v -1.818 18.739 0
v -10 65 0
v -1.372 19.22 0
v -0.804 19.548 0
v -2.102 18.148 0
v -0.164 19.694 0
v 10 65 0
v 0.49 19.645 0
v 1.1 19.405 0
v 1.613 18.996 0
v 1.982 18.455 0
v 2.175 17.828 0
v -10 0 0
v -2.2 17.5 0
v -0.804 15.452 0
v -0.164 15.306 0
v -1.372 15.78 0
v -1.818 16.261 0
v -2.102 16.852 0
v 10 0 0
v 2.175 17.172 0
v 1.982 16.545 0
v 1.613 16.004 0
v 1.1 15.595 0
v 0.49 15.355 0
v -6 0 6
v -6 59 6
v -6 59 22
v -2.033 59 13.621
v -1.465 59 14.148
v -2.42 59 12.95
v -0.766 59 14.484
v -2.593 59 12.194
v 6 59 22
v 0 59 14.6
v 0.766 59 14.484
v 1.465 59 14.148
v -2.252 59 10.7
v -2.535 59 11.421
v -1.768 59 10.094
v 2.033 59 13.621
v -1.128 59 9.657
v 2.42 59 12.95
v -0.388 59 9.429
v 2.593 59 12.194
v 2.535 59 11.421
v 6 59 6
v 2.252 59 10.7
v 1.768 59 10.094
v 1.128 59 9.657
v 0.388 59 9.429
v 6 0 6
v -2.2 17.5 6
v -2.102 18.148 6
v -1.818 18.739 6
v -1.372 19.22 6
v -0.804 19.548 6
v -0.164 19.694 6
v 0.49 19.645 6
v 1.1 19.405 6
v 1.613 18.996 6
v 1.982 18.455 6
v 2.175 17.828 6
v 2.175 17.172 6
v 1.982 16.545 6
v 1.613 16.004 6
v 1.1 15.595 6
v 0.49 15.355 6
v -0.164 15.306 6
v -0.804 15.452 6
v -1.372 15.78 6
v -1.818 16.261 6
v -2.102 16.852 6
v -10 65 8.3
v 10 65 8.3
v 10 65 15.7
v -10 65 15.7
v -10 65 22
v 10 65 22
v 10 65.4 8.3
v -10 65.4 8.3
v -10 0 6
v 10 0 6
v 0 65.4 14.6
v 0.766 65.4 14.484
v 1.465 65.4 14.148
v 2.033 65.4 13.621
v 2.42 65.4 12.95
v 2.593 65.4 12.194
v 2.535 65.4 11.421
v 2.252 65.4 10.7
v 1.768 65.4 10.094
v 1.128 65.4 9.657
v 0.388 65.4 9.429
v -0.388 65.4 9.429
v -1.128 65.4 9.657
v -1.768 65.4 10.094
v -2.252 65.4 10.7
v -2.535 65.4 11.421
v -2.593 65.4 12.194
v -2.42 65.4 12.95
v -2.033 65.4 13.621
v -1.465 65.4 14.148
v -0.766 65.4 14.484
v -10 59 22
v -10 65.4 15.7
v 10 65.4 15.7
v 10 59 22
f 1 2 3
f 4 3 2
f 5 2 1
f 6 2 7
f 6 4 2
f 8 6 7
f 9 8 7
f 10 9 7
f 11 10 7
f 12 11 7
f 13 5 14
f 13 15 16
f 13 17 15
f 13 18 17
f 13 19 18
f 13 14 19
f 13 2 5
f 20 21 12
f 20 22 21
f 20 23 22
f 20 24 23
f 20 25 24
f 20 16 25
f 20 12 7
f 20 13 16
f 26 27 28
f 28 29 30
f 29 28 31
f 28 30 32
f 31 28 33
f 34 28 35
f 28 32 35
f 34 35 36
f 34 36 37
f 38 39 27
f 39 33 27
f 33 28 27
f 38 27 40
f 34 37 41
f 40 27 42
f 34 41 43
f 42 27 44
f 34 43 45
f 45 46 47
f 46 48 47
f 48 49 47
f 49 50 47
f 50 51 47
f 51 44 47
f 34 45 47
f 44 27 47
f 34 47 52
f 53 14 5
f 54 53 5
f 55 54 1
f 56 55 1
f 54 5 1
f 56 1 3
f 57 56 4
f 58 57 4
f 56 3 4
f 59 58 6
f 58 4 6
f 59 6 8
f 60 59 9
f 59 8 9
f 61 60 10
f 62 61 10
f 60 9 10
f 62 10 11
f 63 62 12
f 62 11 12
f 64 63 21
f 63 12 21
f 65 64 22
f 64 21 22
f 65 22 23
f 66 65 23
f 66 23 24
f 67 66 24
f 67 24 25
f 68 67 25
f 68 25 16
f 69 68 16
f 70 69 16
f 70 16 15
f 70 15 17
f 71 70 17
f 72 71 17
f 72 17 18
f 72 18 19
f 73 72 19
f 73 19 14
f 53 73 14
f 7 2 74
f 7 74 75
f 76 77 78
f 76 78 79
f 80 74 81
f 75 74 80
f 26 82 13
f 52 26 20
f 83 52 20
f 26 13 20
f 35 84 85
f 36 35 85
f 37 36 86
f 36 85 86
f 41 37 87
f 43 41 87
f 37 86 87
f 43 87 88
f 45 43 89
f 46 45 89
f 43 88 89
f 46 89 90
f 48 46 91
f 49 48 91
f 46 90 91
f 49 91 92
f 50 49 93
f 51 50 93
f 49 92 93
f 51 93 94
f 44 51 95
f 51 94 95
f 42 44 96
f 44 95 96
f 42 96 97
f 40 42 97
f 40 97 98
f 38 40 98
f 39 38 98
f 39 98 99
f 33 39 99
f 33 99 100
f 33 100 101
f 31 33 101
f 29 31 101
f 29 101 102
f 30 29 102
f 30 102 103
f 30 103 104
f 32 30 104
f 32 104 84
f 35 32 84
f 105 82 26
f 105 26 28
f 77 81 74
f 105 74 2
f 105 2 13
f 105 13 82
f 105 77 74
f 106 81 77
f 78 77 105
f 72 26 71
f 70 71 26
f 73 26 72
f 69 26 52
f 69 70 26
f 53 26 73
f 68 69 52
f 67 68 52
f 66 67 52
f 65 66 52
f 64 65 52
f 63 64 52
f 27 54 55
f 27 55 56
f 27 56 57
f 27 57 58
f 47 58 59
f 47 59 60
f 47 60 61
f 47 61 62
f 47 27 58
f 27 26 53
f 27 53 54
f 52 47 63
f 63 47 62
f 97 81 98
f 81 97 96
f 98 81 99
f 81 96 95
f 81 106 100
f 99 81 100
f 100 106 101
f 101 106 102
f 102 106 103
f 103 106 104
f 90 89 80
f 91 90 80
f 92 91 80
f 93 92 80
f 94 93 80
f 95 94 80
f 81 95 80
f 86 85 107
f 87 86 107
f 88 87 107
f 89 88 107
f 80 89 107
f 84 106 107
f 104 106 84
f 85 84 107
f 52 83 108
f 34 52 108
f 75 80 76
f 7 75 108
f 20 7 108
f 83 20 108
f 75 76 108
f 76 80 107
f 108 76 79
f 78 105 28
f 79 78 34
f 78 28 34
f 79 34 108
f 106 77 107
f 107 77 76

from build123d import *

# Parameters (mm, degrees)
SKETCH_3_W          = 20
SKETCH_3_H          = 59
EXTRUDE_2_DEPTH     = 6
SKETCH_10_R         = 2.2
CUT_EXTRUDE_3_DEPTH = 61.141499815
SKETCH_11_W         = 20
SKETCH_11_H         = 22
EXTRUDE_5_DEPTH     = 6
SKETCH_9_W          = 20
SKETCH_9_H          = 7.4
EXTRUDE_4_DEPTH     = 0.4
SKETCH_13_R         = 2.6
CUT_EXTRUDE_4_DEPTH = 70.722019477
EXTRUDE_6_DEPTH     = 4


with BuildPart() as part:
    # Эскиз3 → Бобышка-Вытянуть2 (new body)
    with BuildSketch(Plane.XY):
        with Locations((0, 29.5)):
            Rectangle(SKETCH_3_W, SKETCH_3_H)
    extrude(amount=EXTRUDE_2_DEPTH)

    # Эскиз10 → Вырез-Вытянуть3 (cut, through all)
    with BuildSketch(Plane(origin=(0, 0, 0), x_dir=(-1, 0, 0), z_dir=(0, 0, -1))):
        with Locations((0, 17.5)):
            Circle(SKETCH_10_R)
    extrude(amount=-CUT_EXTRUDE_3_DEPTH, mode=Mode.SUBTRACT)

    # Эскиз11 → Бобышка-Вытянуть5 (add)
    with BuildSketch(Plane(origin=(0, 59, 0), x_dir=(1, 0, 0), z_dir=(0, 1, 0))):
        with Locations((0, -11)):
            Rectangle(SKETCH_11_W, SKETCH_11_H)
    extrude(amount=EXTRUDE_5_DEPTH)

    # Эскиз9 → Бобышка-Вытянуть4 (add)
    with BuildSketch(Plane(origin=(0, 65, -43.4), x_dir=(1, 0, 0), z_dir=(0, -1, 0))):
        with Locations((0, 55.4)):
            Rectangle(SKETCH_9_W, SKETCH_9_H)
    extrude(amount=-EXTRUDE_4_DEPTH)

    # Эскиз13 → Вырез-Вытянуть4 (cut, through all)
    with BuildSketch(Plane(origin=(0, 65.4, 0), x_dir=(1, 0, 0), z_dir=(0, 1, 0))):
        with Locations(Location((0, -12, 0), (0, 0, 270))):
            Circle(SKETCH_13_R)
    extrude(amount=-CUT_EXTRUDE_4_DEPTH, mode=Mode.SUBTRACT)

    # Эскиз17 → Бобышка-Вытянуть6 (add)
    with BuildSketch(Plane.ZY.offset(10)):
        Polygon((22, 59), (6, 59), (6, 0), align=None)
    extrude_6 = extrude(amount=-EXTRUDE_6_DEPTH)

    # Зеркальное отражение1: Бобышка-Вытянуть6 across plane
    add(extrude_6.mirror(Plane(origin=(0, 0, 0), x_dir=(0, 0, 1), z_dir=(1, 0, 0))))


solid = part.part
